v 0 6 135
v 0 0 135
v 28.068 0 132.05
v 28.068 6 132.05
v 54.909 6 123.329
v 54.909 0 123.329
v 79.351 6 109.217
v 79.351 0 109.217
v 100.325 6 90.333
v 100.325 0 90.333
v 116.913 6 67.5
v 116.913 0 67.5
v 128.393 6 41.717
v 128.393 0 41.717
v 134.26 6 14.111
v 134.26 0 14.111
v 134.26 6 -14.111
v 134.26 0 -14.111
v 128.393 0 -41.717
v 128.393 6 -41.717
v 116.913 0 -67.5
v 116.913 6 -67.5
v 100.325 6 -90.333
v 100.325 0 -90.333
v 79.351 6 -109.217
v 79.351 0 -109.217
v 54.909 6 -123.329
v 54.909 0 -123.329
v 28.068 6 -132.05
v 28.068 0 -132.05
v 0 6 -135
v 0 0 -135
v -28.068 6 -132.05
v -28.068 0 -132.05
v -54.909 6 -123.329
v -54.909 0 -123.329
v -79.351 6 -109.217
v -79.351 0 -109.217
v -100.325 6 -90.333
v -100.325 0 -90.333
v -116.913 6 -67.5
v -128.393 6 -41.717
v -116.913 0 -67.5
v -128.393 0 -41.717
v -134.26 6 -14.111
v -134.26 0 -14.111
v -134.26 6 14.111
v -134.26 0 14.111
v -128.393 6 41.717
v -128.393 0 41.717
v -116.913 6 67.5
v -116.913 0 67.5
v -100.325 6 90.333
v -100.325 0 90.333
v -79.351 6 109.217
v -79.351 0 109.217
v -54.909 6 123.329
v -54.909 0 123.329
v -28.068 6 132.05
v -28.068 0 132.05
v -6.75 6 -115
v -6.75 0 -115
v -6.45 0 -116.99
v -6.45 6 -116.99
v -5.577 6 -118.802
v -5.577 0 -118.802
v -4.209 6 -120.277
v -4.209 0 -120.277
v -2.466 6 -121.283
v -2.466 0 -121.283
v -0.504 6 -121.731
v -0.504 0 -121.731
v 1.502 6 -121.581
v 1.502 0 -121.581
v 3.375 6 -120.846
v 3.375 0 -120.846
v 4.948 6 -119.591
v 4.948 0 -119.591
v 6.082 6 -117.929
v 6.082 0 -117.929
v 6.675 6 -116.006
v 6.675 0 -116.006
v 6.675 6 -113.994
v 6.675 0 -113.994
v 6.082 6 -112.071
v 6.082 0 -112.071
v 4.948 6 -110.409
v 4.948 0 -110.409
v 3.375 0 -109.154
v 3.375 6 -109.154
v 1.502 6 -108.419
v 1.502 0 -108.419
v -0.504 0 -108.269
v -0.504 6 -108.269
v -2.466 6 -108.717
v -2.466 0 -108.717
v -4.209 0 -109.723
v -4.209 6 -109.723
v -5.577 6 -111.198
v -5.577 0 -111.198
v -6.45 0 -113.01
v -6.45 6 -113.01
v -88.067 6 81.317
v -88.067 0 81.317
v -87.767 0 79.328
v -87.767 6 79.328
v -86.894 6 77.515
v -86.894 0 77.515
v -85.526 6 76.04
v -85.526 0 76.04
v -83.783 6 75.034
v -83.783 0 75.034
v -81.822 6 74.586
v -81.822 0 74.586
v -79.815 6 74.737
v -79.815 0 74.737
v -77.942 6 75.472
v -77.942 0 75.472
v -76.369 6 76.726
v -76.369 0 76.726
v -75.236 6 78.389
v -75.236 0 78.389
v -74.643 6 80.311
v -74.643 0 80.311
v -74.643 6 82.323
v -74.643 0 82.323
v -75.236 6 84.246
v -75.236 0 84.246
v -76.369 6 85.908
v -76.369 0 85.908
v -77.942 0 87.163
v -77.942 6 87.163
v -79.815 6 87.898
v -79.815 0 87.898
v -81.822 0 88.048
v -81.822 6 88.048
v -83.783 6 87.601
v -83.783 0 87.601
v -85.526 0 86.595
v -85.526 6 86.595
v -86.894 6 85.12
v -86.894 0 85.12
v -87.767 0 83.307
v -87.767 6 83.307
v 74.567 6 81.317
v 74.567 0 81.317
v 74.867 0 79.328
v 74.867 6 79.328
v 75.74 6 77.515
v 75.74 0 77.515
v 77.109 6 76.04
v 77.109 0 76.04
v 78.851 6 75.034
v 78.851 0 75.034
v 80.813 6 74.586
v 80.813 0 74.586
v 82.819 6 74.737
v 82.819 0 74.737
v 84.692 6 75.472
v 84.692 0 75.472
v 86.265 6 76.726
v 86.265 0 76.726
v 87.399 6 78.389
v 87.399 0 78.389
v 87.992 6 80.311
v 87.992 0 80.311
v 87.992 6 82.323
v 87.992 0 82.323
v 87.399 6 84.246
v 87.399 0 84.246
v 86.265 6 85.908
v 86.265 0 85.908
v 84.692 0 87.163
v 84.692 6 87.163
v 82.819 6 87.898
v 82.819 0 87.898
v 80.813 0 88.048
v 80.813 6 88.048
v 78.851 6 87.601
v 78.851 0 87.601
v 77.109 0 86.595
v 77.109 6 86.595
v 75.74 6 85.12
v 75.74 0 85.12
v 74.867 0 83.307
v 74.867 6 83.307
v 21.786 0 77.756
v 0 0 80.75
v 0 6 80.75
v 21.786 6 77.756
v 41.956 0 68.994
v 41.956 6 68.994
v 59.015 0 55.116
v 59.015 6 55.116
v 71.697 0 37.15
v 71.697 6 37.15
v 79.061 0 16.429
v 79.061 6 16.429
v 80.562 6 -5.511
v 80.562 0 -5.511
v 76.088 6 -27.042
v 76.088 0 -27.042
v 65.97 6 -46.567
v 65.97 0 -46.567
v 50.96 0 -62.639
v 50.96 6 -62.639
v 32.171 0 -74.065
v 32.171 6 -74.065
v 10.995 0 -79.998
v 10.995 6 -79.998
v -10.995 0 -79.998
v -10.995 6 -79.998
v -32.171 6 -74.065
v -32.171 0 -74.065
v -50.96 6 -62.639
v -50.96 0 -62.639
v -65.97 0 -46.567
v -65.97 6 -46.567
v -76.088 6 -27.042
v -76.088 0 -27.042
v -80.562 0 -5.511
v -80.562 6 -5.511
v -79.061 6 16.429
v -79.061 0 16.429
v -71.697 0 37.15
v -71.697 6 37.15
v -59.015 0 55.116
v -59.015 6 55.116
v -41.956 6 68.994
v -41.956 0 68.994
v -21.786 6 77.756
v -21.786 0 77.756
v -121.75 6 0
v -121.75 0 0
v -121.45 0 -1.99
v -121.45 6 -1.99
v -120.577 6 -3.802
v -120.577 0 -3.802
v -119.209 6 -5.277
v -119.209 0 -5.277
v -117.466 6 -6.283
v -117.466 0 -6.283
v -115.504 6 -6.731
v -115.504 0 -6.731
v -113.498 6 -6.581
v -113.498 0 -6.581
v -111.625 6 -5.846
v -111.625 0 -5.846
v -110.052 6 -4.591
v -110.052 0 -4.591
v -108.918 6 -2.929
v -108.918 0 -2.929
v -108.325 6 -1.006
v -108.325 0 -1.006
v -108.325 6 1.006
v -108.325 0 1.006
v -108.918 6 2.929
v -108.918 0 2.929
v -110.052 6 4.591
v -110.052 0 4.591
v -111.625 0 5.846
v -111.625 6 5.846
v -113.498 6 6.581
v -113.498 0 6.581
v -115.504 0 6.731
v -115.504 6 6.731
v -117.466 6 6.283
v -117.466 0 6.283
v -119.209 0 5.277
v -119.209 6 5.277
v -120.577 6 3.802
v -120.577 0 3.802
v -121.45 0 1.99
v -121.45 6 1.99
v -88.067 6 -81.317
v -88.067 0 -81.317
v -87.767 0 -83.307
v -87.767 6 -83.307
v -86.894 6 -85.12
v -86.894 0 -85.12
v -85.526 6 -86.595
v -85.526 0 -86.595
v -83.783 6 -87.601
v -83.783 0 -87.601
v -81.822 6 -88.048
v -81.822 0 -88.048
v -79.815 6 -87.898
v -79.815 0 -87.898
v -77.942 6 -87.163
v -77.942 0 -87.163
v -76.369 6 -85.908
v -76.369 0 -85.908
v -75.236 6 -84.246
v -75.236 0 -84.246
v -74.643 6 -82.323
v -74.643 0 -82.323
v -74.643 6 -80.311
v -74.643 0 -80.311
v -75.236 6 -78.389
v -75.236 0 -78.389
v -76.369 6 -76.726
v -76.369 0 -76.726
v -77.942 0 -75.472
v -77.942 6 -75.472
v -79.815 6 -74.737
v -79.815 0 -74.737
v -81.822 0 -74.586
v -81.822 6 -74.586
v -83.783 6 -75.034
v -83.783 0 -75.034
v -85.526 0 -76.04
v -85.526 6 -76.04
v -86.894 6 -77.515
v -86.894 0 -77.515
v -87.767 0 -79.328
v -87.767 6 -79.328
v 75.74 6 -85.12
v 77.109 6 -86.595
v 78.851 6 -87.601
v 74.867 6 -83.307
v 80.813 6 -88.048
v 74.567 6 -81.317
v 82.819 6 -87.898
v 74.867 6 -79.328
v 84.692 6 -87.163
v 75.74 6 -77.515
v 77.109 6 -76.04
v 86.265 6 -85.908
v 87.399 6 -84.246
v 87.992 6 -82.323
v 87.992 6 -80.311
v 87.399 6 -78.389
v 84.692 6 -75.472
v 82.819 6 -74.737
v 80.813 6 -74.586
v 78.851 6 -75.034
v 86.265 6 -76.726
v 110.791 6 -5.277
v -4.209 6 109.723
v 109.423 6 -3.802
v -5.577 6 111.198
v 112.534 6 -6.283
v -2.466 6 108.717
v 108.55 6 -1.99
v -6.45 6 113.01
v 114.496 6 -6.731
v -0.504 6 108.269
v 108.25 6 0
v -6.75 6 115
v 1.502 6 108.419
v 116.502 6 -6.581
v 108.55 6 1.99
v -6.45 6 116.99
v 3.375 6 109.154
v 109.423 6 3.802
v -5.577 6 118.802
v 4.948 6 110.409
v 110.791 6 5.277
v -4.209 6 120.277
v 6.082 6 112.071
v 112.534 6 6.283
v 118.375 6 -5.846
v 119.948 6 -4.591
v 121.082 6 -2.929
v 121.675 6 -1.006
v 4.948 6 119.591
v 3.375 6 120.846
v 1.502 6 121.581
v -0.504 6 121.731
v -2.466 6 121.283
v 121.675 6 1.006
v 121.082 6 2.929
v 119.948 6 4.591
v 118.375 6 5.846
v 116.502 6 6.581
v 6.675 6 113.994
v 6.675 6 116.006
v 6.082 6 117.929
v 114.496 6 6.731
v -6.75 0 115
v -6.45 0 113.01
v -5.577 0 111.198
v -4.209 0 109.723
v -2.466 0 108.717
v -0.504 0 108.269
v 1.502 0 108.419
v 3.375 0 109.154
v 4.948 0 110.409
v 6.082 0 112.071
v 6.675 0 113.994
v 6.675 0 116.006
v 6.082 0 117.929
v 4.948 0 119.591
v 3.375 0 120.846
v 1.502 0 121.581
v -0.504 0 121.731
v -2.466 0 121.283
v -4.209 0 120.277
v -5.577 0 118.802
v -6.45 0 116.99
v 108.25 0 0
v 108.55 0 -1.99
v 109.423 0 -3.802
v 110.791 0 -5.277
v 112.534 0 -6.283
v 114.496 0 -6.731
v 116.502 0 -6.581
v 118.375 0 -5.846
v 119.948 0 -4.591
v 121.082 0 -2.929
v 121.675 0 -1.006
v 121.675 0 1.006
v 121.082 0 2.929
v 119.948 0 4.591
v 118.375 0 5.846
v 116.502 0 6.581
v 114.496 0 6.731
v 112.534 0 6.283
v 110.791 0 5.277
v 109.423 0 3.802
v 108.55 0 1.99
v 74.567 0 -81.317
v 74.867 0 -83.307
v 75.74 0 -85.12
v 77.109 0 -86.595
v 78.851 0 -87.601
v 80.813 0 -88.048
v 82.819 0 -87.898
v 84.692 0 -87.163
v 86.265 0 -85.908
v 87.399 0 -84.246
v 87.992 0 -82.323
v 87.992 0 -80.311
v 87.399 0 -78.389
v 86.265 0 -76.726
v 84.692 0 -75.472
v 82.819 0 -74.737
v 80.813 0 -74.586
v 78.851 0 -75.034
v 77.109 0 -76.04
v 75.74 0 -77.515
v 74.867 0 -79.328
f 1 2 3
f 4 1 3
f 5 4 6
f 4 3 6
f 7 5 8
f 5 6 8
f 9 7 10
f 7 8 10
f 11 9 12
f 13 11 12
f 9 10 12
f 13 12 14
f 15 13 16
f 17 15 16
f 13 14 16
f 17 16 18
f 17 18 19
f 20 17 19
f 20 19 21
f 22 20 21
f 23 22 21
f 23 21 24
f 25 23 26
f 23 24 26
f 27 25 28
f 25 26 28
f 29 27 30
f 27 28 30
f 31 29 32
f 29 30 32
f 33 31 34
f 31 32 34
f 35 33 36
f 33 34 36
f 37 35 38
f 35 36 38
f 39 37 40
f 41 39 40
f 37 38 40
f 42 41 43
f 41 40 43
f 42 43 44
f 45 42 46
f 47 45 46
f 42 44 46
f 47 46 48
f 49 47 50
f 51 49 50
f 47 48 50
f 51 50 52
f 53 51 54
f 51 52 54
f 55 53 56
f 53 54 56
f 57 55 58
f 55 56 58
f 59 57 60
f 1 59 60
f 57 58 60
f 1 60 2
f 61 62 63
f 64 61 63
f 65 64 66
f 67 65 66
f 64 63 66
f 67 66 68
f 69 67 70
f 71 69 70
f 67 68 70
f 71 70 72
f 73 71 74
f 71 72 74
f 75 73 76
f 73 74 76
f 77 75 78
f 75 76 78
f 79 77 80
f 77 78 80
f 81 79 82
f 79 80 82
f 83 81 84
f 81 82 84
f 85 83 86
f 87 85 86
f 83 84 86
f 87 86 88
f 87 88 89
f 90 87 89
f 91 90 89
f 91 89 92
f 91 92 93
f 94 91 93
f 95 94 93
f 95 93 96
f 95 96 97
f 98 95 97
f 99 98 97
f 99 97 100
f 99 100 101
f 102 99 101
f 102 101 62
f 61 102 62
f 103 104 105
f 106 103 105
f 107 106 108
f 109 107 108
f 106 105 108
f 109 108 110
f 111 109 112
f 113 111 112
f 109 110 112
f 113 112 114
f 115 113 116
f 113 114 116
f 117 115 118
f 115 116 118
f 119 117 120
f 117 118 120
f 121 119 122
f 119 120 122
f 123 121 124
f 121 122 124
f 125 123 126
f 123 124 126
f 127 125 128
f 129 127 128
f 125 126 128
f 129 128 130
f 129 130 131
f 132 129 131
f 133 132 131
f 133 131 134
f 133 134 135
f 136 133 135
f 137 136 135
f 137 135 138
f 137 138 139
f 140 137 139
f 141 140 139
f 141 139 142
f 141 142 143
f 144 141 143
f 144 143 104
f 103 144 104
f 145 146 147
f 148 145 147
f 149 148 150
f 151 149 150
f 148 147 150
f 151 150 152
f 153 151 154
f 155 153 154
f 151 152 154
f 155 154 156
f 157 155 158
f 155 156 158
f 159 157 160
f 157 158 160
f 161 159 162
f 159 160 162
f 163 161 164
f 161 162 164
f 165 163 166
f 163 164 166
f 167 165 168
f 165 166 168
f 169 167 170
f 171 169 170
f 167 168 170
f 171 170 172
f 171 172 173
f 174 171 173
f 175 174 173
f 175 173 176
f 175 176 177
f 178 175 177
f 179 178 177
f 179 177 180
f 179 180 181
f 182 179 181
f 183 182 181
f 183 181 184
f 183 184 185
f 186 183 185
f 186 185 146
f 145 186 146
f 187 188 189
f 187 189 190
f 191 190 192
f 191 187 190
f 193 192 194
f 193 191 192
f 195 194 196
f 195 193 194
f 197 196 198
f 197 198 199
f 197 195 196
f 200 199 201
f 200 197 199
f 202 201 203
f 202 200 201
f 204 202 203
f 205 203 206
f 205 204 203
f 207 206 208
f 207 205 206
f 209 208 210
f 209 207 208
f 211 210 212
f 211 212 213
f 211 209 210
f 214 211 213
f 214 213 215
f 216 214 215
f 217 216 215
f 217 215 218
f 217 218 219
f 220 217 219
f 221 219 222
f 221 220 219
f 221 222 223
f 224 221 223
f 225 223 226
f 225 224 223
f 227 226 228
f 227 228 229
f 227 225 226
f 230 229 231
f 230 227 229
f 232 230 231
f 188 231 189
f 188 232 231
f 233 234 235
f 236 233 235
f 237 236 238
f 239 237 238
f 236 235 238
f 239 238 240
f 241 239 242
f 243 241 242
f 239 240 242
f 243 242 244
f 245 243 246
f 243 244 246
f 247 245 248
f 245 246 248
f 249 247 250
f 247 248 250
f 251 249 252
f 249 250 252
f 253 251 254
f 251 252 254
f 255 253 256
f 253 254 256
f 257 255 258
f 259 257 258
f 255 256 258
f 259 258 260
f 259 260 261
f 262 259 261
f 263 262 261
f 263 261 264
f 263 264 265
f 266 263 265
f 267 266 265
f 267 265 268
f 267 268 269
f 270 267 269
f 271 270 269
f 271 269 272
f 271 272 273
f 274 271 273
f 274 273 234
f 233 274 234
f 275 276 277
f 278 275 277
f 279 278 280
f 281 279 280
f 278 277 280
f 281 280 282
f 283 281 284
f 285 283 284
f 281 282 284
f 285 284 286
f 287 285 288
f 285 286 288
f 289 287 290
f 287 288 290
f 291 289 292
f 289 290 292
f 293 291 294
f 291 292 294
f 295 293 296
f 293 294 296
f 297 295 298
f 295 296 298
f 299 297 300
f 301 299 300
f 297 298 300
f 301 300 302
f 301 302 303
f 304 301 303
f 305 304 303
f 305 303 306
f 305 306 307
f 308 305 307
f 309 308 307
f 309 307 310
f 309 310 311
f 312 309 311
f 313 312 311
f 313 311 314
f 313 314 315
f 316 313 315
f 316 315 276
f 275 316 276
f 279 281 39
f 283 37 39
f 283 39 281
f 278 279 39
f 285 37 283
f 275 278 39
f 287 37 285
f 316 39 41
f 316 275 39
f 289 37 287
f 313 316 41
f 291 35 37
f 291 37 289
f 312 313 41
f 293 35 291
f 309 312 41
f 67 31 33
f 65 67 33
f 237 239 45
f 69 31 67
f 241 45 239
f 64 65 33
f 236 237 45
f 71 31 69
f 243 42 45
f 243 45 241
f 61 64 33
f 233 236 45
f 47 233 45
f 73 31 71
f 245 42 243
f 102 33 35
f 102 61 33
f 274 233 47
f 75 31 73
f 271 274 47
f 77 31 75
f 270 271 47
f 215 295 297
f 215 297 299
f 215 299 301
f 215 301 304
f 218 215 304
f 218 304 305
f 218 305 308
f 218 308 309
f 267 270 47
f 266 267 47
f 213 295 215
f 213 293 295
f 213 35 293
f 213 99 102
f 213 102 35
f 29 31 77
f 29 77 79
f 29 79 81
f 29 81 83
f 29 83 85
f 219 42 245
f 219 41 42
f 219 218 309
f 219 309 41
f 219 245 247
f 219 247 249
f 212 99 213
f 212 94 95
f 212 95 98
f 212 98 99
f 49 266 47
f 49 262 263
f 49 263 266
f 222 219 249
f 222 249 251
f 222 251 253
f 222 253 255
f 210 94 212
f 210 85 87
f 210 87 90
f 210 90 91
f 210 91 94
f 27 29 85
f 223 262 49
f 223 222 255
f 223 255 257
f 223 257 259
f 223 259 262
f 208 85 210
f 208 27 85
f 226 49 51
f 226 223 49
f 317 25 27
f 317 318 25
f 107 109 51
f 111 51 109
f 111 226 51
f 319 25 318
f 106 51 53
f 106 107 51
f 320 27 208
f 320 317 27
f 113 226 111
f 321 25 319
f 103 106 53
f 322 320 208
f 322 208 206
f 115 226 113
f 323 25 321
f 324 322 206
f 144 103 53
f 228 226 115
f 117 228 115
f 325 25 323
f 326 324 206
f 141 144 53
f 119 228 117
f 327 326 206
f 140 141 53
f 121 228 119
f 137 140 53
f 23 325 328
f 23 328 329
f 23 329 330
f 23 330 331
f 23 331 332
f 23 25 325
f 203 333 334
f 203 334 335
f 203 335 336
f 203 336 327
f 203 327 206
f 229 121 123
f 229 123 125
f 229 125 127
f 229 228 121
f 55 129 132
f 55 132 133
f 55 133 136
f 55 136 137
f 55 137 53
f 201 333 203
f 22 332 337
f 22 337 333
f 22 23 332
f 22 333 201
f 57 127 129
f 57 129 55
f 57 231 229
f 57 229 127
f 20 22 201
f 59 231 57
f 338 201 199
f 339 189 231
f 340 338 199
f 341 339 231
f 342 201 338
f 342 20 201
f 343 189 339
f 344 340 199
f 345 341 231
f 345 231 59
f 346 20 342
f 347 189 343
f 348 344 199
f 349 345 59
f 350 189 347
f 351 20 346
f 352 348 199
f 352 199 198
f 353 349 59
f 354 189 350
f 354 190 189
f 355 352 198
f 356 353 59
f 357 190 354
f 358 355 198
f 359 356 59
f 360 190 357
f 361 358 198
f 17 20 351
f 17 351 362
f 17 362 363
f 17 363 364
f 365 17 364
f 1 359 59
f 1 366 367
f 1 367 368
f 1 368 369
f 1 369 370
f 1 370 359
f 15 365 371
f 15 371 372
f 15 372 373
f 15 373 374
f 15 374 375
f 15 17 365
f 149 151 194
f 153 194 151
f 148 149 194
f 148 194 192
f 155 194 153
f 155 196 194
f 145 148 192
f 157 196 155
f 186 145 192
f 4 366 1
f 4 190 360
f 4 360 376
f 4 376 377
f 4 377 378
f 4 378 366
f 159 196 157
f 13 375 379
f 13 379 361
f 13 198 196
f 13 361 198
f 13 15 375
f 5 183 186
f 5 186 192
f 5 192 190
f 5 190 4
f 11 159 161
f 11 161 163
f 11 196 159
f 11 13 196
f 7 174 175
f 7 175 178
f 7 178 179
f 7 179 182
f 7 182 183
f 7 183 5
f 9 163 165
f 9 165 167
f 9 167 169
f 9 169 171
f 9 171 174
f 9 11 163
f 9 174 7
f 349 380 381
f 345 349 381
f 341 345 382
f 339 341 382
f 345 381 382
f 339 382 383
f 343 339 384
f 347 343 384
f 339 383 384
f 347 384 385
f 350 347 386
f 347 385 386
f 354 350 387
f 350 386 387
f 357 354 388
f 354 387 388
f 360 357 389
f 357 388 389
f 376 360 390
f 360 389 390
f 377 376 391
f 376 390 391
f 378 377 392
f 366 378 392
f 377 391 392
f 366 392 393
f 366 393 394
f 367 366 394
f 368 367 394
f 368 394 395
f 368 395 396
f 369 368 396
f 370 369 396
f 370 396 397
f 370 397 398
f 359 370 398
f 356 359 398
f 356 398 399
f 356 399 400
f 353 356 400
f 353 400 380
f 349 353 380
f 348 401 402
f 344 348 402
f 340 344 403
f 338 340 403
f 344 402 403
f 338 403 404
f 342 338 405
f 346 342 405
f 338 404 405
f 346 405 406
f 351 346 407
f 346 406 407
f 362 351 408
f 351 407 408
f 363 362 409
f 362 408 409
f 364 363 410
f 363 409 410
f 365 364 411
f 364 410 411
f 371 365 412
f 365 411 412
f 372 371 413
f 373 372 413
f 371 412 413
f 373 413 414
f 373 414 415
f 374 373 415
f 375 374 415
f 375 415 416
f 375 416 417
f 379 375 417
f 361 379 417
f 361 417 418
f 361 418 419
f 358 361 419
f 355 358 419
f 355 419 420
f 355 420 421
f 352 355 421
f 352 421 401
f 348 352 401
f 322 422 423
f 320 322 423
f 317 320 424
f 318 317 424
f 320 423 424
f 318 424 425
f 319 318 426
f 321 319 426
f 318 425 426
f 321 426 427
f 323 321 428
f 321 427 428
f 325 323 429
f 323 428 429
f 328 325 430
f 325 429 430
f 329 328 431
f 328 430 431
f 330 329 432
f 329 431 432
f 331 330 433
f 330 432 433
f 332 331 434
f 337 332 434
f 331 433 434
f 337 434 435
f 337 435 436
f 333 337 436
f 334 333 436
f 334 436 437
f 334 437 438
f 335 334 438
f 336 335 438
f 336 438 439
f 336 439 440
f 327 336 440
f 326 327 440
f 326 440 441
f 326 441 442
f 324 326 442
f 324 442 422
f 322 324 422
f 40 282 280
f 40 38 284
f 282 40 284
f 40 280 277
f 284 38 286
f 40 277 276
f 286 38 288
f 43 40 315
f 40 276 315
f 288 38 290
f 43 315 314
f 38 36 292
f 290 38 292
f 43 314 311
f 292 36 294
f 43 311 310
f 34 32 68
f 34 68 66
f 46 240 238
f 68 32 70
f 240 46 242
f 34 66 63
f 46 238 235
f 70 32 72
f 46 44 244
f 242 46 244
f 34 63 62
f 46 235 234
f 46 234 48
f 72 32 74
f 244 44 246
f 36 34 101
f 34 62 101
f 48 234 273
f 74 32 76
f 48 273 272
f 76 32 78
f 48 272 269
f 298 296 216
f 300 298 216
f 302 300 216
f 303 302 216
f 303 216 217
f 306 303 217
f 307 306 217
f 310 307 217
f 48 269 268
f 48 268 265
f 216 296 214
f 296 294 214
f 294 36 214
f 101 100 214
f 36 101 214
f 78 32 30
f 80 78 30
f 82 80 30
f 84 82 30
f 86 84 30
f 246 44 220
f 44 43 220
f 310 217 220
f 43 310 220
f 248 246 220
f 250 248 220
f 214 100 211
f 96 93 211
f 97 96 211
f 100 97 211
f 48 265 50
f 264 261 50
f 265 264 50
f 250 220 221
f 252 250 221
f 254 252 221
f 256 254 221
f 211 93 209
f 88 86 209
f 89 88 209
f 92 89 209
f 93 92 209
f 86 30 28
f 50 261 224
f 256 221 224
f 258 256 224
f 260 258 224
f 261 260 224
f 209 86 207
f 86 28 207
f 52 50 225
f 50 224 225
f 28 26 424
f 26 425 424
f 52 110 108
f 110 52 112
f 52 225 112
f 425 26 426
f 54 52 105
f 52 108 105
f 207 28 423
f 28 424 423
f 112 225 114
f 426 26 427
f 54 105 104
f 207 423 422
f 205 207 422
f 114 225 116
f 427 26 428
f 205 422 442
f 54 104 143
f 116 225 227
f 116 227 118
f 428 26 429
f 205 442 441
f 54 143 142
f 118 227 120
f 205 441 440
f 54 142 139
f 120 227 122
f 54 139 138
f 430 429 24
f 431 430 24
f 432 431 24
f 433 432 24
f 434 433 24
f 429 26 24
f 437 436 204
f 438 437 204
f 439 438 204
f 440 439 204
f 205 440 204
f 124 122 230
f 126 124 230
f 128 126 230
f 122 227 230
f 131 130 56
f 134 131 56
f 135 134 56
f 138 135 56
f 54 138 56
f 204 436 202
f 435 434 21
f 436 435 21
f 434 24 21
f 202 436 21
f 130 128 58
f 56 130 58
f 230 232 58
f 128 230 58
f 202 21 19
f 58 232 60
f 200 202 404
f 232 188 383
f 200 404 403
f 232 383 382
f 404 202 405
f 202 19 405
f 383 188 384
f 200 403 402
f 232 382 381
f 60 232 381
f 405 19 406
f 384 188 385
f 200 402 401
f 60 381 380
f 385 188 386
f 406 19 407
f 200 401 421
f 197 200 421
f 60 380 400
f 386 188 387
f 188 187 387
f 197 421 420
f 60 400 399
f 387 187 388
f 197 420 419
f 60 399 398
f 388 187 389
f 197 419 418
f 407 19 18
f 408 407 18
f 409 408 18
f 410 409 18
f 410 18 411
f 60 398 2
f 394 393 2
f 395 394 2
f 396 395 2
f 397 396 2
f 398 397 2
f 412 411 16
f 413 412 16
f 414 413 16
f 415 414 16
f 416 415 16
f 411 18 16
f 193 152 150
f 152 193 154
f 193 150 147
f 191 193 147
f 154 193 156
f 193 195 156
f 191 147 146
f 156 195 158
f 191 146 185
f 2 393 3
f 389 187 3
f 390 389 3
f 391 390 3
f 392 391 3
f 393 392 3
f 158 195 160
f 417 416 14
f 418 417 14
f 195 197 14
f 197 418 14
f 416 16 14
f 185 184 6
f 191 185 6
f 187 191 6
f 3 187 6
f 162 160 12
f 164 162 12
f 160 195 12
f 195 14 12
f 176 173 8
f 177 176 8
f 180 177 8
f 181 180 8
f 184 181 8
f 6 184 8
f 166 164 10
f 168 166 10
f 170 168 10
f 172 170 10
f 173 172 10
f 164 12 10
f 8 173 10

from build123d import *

# Parameters (mm, degrees)
SKETCH1_R             = 135
SKETCH1_R_2           = 80.75
BOSS_EXTRUDE1_DEPTH   = 6
M12_CLEARANCE_HOLE1_D = 13.5


with BuildPart() as part:
    # Sketch1 → Boss-Extrude1 (new body)
    with BuildSketch(Plane(origin=(0, 0, 0), x_dir=(1, 0, 0), z_dir=(0, 1, 0))):
        with Locations(Location((0, 0, 0), (0, 0, 270))):
            Circle(SKETCH1_R)
        with Locations(Location((0, 0, 0), (0, 0, 270))):
            Circle(SKETCH1_R_2, mode=Mode.SUBTRACT)
    extrude(amount=BOSS_EXTRUDE1_DEPTH)

    # M12 Clearance Hole1 (through all)
    with Locations(Plane(origin=(0, 6, 0), x_dir=(1, 0, 0), z_dir=(0, 1, 0))):
        with Locations((0, 115), (81.317279836, 81.317279836), (115, 0), (81.317279836, -81.317279836), (0, -115), (-81.317279836, -81.317279836), (-115, 0), (-81.317279836, 81.317279836), (0, 0)):
            Hole(M12_CLEARANCE_HOLE1_D / 2)


solid = part.part
